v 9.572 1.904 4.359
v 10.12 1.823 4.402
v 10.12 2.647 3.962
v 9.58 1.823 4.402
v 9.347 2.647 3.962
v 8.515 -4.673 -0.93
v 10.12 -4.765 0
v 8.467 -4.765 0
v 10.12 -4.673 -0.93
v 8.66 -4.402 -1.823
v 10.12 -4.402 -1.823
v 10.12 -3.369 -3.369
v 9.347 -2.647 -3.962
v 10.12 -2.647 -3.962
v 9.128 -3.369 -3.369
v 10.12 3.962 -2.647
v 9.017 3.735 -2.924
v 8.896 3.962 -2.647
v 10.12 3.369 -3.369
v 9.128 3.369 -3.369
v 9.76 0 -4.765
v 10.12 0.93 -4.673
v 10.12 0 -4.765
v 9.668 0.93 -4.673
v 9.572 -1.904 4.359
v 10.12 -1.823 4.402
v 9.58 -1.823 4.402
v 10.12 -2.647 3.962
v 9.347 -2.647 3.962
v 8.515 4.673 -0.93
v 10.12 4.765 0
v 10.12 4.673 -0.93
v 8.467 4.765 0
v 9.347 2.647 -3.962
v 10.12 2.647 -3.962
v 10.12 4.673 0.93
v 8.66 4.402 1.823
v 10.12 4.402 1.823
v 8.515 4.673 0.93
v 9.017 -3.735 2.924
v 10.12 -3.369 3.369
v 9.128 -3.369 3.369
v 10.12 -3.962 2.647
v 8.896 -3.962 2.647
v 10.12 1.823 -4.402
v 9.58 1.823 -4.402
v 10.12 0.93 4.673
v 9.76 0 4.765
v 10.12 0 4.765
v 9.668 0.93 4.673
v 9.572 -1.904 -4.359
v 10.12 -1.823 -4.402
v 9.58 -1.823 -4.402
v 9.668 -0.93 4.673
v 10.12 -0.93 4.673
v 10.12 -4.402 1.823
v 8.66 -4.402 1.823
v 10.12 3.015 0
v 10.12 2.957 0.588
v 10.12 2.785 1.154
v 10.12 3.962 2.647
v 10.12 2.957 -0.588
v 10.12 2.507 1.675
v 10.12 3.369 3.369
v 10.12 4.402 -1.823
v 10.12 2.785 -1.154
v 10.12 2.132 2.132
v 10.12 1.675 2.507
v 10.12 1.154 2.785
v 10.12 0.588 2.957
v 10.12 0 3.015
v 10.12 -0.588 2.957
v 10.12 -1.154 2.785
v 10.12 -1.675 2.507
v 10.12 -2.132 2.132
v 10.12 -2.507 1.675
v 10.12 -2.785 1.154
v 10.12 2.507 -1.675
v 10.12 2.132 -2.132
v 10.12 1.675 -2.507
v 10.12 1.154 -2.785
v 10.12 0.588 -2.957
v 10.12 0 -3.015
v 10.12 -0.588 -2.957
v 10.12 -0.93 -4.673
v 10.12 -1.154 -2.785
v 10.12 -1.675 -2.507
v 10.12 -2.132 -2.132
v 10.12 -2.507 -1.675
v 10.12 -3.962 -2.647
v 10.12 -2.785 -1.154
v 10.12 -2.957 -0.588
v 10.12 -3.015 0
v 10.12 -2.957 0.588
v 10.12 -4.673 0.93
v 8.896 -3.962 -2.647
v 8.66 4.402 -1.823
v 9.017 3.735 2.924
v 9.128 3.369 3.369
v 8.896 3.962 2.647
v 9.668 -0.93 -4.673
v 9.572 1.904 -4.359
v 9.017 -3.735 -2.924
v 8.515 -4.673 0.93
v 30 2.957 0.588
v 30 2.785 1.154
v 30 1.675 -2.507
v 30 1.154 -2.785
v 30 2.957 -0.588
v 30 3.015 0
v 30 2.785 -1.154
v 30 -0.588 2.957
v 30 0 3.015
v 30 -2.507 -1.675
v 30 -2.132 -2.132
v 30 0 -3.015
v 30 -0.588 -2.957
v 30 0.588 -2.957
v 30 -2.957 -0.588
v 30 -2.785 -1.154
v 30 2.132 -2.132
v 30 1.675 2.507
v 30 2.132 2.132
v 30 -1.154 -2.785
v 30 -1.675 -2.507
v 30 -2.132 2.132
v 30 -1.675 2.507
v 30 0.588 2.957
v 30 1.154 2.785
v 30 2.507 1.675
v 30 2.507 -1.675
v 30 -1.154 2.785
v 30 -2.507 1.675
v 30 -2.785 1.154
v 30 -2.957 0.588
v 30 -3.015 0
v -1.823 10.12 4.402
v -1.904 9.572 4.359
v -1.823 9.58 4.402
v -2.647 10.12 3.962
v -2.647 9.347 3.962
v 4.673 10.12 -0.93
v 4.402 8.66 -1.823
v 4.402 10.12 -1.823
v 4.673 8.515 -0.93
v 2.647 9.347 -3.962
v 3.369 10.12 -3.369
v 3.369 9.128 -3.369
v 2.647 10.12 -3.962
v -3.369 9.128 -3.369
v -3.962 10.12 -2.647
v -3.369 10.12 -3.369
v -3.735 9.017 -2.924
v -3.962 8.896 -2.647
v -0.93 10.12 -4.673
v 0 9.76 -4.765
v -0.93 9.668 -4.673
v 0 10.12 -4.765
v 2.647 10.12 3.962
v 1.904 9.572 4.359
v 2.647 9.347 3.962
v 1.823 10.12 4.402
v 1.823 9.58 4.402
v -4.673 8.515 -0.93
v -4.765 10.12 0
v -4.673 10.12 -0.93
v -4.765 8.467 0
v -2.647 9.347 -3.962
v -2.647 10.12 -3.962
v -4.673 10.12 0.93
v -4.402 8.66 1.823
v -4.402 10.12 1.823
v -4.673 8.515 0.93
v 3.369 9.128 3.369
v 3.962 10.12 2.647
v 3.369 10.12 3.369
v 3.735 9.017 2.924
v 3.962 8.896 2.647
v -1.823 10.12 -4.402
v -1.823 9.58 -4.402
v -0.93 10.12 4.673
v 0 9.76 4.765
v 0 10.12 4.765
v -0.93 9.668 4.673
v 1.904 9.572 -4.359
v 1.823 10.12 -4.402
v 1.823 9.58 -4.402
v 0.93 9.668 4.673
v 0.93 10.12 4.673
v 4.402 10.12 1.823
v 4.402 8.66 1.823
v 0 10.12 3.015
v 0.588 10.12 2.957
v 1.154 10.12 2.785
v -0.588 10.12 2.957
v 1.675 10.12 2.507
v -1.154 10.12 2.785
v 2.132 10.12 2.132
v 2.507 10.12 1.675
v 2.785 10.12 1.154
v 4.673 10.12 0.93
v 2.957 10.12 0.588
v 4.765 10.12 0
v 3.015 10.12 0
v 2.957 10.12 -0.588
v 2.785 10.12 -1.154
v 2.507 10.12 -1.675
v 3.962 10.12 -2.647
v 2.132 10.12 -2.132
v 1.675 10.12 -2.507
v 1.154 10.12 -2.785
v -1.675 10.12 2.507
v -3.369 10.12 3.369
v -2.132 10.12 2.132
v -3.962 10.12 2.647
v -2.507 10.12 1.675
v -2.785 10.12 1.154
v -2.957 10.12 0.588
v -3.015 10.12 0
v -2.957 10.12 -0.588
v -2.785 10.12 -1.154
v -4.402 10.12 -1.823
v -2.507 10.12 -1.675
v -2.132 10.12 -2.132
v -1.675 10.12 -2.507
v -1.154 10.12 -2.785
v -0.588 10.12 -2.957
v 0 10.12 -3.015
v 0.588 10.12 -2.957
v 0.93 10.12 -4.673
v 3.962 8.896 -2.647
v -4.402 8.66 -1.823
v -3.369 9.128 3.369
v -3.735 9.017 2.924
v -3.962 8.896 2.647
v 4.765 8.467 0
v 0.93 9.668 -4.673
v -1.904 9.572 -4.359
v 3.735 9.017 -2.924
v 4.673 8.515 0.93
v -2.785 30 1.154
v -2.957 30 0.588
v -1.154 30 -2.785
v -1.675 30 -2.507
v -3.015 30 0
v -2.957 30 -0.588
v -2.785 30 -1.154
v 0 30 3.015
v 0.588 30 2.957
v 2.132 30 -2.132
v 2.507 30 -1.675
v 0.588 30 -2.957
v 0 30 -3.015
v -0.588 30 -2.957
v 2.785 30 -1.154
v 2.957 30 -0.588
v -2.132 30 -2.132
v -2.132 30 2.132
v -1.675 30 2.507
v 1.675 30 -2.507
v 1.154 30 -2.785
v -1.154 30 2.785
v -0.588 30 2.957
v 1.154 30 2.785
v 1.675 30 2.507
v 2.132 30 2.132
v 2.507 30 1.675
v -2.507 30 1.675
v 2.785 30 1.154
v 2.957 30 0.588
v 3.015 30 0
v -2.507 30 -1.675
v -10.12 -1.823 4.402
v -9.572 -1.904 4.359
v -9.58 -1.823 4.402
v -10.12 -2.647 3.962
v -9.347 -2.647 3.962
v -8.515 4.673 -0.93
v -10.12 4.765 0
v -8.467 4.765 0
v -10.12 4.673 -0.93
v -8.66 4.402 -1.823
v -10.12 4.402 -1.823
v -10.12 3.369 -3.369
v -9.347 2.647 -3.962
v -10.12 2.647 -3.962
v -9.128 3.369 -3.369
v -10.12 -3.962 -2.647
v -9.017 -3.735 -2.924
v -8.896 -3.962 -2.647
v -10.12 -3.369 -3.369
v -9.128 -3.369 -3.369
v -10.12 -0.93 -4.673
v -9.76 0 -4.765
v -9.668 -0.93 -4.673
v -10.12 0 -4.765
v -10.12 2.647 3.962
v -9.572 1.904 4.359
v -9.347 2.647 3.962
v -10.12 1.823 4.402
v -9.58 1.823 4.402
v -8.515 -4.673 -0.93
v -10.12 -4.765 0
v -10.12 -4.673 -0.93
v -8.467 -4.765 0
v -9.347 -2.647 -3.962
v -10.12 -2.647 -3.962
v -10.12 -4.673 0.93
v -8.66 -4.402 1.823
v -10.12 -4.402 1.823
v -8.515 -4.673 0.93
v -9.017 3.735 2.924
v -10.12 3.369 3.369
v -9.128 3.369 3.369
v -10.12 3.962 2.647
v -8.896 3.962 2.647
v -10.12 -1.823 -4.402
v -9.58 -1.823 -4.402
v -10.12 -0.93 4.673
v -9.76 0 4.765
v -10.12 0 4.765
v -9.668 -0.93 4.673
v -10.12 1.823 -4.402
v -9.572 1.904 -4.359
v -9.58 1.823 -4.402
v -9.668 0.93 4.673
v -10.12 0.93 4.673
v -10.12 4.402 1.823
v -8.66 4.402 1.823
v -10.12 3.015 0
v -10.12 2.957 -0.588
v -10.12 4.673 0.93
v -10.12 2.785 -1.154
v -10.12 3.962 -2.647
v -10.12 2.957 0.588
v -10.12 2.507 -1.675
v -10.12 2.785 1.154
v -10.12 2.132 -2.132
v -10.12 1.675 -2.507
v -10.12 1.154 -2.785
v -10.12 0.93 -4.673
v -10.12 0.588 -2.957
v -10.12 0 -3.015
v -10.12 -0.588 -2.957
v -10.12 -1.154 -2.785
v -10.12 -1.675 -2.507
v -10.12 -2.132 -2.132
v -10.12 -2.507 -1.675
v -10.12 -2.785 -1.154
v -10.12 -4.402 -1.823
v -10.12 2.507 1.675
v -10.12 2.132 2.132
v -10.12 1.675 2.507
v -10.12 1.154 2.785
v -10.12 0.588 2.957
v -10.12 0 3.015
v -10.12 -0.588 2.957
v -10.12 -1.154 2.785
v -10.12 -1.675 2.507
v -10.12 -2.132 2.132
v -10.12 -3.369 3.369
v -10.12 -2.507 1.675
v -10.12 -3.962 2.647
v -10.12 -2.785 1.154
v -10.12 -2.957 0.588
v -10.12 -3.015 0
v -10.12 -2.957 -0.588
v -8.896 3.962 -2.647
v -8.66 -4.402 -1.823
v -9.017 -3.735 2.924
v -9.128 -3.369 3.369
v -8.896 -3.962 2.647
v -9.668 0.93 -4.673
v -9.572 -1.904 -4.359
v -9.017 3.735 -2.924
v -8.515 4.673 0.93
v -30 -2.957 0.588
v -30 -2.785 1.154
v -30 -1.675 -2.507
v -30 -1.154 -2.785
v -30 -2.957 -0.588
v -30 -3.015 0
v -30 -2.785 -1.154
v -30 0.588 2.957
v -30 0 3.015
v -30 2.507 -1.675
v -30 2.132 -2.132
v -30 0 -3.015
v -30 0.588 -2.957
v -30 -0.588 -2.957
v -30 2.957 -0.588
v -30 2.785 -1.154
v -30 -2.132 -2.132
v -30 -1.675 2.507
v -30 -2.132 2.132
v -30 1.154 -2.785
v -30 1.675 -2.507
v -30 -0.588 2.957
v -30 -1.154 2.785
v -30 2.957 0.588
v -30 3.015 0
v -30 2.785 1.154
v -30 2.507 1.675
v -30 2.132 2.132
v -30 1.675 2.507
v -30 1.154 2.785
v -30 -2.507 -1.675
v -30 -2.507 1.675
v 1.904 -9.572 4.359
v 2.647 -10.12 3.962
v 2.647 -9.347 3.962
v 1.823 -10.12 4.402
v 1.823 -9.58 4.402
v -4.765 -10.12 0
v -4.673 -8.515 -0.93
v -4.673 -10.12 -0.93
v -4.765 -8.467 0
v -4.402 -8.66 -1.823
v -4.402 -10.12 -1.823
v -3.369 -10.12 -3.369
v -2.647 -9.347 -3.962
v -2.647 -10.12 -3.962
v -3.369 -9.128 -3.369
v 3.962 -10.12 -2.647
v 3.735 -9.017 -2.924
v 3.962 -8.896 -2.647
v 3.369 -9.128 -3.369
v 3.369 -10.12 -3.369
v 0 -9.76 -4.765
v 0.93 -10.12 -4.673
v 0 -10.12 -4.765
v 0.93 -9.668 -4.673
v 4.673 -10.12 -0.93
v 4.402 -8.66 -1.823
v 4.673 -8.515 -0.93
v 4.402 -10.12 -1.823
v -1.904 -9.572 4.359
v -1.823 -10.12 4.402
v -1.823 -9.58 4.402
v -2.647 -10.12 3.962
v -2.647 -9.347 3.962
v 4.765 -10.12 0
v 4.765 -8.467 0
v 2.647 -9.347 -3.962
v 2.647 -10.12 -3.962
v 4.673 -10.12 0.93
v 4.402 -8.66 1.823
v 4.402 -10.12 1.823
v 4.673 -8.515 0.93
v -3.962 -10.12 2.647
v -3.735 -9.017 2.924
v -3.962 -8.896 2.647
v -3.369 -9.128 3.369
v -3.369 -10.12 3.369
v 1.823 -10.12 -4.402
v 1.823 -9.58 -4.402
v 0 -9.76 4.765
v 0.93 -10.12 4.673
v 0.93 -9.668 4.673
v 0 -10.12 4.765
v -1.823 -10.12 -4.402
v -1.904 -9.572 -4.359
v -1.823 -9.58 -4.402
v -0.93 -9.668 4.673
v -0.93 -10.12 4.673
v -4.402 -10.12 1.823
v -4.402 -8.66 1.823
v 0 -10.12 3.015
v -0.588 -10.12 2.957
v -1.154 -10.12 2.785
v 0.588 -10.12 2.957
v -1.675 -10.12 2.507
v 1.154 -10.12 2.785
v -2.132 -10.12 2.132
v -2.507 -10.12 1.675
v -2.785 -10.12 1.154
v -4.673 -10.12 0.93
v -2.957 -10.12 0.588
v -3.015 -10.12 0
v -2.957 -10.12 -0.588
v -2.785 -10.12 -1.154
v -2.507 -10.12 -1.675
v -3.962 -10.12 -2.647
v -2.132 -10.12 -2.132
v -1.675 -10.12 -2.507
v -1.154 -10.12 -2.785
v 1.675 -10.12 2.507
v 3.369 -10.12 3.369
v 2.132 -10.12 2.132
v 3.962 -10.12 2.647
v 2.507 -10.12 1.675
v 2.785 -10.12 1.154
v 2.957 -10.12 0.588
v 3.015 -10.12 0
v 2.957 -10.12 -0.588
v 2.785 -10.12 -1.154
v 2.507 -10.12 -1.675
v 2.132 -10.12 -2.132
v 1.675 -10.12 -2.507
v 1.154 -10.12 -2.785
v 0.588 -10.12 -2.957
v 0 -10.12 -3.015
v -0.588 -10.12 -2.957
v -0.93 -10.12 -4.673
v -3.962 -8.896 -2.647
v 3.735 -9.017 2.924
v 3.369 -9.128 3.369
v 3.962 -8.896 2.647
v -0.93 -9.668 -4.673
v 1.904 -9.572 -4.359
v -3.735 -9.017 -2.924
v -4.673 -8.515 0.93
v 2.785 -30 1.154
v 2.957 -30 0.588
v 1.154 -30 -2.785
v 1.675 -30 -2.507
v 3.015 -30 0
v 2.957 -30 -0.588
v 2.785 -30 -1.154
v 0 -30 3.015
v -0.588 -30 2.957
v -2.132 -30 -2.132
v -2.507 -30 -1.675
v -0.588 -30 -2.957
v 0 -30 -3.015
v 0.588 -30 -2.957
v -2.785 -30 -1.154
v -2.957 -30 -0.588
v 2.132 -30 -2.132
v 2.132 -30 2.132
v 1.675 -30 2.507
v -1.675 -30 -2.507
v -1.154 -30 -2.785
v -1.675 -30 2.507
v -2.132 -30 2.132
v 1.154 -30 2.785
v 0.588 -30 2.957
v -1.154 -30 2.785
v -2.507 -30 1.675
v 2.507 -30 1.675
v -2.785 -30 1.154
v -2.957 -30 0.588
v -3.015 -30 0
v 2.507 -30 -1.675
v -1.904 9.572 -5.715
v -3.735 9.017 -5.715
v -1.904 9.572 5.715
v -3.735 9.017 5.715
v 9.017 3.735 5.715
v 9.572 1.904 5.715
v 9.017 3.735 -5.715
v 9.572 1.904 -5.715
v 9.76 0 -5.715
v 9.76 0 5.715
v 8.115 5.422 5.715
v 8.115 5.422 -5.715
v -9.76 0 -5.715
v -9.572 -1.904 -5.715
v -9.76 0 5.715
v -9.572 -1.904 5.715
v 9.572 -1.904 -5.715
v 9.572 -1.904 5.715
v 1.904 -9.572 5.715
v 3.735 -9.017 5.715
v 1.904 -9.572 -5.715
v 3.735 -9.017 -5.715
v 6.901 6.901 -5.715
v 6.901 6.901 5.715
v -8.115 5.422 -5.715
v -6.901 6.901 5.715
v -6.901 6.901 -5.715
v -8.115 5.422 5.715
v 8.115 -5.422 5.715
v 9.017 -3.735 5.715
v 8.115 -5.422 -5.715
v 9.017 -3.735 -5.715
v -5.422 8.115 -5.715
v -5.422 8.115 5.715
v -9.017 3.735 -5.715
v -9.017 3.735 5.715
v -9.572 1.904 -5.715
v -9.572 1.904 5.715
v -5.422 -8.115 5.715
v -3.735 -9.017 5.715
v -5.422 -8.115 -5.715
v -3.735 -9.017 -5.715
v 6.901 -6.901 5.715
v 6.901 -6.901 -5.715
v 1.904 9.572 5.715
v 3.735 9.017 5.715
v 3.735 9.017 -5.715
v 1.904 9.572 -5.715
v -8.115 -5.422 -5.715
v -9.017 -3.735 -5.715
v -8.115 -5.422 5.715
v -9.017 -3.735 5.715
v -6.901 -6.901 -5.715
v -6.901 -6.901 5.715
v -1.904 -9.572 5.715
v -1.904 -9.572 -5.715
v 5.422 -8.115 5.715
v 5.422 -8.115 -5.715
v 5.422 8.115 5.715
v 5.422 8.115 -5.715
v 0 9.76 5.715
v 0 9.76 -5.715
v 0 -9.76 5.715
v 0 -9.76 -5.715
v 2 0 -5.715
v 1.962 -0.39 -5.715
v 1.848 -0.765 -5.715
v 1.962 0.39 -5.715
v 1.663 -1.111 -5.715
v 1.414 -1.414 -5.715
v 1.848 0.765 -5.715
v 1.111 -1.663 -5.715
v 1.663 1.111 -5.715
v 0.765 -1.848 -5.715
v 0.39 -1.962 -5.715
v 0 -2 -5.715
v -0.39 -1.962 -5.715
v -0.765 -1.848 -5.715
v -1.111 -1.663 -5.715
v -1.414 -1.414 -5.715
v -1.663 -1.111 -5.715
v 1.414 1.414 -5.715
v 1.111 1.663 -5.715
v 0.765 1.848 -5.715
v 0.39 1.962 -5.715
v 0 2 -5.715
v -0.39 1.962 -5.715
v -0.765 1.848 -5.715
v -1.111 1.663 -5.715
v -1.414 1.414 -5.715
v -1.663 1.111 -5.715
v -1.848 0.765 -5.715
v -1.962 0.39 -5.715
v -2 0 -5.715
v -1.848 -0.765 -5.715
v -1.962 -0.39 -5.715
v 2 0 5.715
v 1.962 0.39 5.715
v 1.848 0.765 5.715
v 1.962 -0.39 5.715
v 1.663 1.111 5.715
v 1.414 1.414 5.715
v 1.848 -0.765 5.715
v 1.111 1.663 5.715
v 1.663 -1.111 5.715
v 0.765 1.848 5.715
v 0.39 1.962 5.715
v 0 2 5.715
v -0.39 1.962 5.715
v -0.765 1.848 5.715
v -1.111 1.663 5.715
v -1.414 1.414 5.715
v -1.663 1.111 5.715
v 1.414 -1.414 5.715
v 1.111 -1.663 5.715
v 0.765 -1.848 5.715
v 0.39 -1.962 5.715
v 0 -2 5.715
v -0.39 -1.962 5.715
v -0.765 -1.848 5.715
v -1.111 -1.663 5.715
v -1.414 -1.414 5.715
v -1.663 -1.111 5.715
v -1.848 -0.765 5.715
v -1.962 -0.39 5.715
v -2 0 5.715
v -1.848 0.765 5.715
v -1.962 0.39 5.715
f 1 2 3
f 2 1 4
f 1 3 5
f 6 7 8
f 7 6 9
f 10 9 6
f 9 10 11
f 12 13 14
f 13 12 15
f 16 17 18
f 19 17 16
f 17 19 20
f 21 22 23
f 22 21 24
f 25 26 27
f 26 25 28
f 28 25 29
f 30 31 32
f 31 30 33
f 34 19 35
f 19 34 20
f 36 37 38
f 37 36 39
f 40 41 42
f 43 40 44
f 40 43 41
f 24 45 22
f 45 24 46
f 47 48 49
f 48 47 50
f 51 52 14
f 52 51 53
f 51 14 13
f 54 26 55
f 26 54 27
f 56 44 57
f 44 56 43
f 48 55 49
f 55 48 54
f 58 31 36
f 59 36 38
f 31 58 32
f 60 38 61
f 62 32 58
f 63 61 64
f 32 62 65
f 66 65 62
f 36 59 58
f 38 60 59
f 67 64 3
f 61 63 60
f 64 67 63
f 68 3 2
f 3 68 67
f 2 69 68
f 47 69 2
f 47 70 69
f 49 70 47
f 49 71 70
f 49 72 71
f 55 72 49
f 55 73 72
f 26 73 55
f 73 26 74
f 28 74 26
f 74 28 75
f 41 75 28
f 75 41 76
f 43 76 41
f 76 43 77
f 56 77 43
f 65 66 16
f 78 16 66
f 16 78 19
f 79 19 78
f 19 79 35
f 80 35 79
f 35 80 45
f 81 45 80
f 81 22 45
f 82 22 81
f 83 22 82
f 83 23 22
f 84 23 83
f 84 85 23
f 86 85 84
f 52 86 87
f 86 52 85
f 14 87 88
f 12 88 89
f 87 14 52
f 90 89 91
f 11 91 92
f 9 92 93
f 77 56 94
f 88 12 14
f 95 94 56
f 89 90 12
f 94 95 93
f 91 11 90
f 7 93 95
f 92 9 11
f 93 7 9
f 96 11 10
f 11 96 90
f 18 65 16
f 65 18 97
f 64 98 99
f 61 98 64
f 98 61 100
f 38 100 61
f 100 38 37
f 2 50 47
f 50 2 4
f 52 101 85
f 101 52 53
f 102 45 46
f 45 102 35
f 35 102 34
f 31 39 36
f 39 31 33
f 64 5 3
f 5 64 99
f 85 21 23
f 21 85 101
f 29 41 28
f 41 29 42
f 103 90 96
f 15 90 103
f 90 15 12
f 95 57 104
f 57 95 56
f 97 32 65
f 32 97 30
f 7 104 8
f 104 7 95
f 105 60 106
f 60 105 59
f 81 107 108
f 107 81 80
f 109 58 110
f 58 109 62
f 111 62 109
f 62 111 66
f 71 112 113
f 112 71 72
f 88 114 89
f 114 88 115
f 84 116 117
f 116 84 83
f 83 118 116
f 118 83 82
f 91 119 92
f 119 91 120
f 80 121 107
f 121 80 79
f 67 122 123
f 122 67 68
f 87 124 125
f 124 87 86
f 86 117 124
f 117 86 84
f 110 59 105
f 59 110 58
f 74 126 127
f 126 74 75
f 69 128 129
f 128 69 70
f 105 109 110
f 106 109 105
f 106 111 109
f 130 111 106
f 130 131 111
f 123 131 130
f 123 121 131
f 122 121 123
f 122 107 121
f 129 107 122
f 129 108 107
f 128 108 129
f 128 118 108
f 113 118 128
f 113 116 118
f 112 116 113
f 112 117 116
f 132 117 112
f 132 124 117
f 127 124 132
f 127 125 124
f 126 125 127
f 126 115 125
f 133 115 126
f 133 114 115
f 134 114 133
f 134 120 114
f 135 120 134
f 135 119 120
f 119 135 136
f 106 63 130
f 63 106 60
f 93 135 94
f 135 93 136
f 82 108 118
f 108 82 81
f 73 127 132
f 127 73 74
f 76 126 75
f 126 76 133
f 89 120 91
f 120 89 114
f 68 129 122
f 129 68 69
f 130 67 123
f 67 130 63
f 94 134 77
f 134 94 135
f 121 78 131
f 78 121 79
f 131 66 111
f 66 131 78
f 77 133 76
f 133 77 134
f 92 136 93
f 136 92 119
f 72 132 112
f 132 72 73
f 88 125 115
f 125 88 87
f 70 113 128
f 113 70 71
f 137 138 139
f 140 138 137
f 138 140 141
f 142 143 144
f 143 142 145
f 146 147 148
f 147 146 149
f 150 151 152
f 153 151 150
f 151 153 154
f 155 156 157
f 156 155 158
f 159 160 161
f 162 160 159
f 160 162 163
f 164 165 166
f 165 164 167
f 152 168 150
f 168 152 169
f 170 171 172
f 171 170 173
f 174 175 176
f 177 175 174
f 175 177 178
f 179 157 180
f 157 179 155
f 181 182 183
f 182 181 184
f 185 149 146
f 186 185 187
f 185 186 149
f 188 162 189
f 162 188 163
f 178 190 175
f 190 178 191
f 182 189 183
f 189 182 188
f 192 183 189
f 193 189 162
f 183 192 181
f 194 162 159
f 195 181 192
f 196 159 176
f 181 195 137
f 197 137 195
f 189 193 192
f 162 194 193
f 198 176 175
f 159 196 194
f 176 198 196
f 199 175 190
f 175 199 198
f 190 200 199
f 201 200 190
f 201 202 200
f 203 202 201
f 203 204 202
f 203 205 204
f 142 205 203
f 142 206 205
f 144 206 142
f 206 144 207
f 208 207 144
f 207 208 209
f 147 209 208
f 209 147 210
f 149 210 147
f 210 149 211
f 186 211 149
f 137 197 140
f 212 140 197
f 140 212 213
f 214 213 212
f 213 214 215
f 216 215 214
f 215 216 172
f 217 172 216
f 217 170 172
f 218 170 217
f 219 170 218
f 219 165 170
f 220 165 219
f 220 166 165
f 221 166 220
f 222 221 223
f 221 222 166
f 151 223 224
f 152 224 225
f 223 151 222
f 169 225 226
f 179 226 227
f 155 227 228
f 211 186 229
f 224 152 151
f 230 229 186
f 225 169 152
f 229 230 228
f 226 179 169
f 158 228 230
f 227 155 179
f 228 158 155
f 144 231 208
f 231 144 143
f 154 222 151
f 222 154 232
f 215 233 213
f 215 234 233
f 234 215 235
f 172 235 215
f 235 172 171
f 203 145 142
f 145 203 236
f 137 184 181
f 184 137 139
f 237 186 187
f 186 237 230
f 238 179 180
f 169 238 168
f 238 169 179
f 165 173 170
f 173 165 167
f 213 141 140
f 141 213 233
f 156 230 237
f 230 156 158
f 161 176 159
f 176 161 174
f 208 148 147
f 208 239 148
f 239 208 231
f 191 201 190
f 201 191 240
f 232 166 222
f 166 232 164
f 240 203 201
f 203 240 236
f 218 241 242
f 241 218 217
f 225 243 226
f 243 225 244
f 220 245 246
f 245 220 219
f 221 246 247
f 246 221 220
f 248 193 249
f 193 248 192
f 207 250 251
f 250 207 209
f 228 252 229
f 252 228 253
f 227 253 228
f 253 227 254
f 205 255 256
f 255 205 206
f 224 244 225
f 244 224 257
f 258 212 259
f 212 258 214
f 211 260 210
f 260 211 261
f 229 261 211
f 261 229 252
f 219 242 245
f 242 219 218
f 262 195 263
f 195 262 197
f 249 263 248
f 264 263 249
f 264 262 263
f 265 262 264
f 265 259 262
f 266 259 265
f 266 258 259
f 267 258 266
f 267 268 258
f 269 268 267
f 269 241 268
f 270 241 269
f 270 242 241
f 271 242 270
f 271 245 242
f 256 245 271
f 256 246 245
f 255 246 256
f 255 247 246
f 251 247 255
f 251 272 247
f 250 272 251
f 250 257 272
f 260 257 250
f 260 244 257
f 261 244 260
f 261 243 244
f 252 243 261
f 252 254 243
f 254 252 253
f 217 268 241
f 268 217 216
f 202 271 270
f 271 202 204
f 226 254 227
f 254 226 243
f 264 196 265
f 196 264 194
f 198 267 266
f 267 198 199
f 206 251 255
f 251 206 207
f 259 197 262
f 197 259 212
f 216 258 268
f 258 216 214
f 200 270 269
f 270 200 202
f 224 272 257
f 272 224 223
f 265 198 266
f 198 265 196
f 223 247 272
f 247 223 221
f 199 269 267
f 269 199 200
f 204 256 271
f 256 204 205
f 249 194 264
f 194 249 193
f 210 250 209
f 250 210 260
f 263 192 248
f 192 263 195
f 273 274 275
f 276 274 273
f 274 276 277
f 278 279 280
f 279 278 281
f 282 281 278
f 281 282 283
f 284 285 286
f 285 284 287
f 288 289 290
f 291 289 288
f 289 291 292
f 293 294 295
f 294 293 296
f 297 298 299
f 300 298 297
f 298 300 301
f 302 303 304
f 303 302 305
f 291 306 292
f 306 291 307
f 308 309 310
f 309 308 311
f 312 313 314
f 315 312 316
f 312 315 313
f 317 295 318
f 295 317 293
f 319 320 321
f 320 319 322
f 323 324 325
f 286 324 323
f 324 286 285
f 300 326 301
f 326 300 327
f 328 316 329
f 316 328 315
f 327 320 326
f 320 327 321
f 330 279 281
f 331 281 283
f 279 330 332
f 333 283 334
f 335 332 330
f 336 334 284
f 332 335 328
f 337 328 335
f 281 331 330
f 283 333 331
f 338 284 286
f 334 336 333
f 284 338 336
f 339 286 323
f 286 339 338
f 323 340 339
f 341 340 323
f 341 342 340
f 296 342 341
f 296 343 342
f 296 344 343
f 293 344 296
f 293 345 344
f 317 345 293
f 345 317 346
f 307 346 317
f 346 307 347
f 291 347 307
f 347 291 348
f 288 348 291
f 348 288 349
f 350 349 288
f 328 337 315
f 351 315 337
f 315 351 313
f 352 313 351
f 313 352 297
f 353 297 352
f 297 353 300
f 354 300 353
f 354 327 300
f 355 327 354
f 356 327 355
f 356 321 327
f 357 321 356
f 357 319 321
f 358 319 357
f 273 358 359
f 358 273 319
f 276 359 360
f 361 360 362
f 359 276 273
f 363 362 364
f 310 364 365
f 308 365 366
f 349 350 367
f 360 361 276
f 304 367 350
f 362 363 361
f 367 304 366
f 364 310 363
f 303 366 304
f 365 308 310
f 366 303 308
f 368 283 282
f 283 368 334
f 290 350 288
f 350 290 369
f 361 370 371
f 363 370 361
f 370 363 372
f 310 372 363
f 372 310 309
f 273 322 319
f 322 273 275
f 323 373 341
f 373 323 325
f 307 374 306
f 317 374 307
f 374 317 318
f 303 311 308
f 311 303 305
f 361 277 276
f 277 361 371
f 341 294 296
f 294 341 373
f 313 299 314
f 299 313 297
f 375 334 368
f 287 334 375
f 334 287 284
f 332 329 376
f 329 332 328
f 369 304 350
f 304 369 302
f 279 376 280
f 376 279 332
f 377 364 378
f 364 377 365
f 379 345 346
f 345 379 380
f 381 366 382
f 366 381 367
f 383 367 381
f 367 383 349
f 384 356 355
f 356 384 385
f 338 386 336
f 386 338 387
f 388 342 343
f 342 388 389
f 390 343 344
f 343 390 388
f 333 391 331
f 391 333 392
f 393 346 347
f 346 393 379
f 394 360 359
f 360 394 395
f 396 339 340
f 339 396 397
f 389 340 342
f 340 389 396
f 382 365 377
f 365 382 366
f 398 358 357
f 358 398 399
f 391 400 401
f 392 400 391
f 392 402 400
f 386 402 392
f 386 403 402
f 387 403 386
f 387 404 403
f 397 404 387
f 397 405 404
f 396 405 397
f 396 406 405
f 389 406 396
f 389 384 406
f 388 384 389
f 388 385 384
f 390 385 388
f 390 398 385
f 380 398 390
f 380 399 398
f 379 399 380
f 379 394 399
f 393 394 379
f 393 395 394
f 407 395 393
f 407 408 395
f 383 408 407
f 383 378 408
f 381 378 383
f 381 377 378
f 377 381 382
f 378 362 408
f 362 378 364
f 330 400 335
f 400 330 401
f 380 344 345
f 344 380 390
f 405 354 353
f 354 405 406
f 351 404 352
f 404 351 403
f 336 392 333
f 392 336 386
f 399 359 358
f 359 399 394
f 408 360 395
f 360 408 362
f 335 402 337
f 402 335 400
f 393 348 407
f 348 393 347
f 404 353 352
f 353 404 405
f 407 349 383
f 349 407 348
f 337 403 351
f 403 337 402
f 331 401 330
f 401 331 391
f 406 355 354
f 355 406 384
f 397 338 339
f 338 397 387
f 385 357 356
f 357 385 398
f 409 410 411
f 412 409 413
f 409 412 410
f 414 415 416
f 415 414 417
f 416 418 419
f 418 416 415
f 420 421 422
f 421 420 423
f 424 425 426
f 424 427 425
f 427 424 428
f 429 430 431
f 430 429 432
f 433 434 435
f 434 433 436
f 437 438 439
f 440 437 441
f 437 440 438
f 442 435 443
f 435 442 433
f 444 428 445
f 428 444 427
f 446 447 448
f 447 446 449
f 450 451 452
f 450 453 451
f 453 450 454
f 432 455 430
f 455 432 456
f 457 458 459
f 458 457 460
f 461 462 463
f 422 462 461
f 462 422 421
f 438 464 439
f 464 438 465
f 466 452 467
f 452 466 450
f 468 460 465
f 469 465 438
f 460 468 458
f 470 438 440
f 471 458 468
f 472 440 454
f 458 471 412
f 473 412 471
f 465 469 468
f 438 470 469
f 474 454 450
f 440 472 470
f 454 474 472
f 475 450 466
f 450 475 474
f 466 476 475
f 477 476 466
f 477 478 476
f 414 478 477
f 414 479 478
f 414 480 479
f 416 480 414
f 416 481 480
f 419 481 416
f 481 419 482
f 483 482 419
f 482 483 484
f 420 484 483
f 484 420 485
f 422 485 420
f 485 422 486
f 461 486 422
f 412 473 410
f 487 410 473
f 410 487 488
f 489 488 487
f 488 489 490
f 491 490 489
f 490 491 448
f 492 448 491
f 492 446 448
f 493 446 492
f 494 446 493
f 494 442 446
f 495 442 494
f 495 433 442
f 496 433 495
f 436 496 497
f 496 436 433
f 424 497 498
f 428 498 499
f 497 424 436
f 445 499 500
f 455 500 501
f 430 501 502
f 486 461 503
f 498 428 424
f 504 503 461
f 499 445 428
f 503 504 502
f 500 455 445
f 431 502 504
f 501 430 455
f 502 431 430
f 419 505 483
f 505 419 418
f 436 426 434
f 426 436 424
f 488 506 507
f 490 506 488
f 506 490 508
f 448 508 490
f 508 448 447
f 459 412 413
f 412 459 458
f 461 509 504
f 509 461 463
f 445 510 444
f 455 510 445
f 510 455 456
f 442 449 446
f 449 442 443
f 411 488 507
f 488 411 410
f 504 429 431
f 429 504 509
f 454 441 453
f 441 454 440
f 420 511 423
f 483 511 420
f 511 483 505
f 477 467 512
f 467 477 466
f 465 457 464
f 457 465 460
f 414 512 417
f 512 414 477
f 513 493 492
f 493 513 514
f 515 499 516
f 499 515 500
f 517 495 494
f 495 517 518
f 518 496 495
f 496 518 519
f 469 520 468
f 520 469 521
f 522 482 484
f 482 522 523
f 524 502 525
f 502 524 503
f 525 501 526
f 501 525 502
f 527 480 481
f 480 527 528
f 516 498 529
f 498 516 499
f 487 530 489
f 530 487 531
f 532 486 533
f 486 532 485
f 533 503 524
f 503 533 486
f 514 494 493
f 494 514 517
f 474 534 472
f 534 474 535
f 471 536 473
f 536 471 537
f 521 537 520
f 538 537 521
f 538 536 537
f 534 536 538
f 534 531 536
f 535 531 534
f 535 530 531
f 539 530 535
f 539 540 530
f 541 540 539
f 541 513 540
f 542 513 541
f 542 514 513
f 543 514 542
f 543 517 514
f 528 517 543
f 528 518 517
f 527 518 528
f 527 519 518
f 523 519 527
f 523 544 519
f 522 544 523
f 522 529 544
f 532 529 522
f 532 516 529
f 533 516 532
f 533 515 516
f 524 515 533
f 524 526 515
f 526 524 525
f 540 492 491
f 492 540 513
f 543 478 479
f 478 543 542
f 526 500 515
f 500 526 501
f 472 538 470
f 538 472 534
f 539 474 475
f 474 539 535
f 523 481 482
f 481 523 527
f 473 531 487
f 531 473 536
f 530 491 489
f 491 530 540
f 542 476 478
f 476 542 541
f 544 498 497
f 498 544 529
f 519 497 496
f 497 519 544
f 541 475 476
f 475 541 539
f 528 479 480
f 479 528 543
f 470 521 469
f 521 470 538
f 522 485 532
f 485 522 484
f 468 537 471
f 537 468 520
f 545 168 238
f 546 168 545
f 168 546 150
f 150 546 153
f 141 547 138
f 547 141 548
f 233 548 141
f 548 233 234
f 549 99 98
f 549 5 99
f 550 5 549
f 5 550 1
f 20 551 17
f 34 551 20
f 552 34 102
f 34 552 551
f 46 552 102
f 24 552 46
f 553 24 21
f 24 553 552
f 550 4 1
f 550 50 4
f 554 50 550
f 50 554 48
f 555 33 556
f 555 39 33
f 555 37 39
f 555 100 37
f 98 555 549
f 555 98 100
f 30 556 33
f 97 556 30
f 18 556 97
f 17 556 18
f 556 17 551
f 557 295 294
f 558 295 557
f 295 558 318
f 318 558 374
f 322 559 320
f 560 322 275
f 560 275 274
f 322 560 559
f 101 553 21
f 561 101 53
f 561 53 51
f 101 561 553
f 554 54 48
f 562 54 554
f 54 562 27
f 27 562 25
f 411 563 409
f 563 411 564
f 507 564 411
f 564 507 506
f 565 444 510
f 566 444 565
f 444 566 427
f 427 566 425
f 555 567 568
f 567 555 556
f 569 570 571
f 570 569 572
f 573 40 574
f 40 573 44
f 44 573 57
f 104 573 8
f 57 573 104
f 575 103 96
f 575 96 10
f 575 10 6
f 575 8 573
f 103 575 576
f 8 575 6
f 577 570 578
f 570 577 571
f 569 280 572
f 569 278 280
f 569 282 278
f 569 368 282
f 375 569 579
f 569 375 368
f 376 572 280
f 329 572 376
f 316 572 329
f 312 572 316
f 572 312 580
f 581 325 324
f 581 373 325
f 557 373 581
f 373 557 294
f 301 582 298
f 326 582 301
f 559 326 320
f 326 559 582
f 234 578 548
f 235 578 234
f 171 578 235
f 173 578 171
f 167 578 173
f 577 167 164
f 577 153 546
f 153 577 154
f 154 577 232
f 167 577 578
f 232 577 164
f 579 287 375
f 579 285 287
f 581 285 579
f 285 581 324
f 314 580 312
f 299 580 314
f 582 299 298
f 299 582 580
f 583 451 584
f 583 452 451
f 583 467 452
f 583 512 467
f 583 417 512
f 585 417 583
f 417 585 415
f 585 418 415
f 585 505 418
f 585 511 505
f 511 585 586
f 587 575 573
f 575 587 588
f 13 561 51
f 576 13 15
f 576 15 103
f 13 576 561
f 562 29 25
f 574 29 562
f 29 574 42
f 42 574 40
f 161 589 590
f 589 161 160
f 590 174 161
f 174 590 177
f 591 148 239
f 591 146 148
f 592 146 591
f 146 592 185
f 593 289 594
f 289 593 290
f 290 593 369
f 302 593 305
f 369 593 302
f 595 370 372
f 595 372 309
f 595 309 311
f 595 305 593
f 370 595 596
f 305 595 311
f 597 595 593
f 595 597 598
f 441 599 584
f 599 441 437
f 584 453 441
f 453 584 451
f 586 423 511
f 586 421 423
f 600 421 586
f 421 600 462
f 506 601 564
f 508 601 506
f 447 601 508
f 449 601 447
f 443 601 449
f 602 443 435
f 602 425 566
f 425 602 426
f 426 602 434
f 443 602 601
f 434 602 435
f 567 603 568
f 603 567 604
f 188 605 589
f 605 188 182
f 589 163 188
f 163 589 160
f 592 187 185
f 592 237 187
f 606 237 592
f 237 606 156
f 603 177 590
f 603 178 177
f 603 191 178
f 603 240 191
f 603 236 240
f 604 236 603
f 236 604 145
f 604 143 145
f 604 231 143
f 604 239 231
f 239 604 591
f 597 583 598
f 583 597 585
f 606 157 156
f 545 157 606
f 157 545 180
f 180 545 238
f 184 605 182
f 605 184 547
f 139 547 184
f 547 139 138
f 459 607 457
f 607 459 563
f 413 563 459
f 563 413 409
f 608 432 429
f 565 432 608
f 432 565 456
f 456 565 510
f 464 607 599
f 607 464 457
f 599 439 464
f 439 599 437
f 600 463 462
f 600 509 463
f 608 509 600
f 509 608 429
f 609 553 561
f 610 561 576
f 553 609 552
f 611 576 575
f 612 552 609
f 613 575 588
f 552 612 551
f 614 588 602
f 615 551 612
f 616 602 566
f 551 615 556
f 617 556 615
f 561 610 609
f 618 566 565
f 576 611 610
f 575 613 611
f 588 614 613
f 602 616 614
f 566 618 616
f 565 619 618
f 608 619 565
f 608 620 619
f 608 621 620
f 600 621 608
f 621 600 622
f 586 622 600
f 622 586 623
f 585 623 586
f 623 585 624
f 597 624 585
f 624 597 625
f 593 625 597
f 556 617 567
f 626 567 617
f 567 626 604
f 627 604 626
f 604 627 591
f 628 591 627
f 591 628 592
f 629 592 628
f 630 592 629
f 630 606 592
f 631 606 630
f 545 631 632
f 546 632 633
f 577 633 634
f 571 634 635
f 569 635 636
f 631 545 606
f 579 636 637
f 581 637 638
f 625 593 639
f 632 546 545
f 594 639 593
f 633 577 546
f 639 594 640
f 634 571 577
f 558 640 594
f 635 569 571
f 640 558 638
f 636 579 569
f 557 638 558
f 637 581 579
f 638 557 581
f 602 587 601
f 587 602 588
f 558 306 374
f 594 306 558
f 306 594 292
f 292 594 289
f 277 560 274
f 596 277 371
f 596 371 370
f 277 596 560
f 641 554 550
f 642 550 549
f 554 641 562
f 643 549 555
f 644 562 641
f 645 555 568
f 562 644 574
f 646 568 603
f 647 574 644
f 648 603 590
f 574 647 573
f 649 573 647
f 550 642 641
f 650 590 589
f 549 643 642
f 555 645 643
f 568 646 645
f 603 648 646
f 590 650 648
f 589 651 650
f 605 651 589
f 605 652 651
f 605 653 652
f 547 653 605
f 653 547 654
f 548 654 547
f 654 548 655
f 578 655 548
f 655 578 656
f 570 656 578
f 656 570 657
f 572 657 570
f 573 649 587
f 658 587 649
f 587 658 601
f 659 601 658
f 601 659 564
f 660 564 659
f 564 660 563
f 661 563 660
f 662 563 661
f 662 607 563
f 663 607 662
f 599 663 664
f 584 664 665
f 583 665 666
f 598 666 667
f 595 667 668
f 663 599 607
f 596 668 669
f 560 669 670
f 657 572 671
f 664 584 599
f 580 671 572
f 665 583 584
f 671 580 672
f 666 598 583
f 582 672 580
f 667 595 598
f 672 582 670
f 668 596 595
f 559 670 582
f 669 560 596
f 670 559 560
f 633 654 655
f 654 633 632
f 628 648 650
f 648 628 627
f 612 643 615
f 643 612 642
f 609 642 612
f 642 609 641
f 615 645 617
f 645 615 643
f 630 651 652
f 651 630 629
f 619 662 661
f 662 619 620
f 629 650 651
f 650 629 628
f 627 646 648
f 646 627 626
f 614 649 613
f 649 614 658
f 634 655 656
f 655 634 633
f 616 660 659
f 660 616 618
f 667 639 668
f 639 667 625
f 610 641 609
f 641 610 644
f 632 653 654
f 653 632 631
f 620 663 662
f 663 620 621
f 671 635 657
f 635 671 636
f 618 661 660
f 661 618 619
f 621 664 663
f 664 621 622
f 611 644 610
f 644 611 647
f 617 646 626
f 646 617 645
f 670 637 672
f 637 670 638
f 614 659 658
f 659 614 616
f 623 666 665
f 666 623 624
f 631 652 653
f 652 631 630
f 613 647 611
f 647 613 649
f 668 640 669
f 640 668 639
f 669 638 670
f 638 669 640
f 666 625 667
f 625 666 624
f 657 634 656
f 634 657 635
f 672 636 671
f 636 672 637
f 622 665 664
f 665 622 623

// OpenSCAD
$fn = 32;

// ----------------------------------------------------------------------
// Cardan cross: 60 mm span, 9.53 mm trunnions
// ----------------------------------------------------------------------

// --- parameters (mm) ---
journal_d = 9.53;         // trunnion diameter
arm_len = 30;             // trunnion length from the centre
step_r = 3.24;            // step position from the centre
step_d = 6.03;            // journal diameter after the step
hub_d = 19.52;            // hub diameter
hub_h = 11.43;            // hub height
bore_d = 4;               // hub bore

difference() {
  union() {
    /* hub along the joint axis */
    cylinder(h = hub_h, d = hub_d, center = true);
    for (a = [0 : 90 : 270]) rotate([0, 0, a]) {
      /* trunnion, sunk into the hub */
      translate([hub_d / 4, 0, 0]) rotate([0, 90, 0]) cylinder(h = step_r + 2, d = journal_d);
      /* stepped journal out to the tip */
      translate([step_r - 0.5, 0, 0]) rotate([0, 90, 0]) cylinder(h = arm_len + 0.5 - step_r, d = step_d);
    }
  }
  /* lubrication bore through the hub, 2.5 mm clear on both sides */
  translate([0, 0, -hub_h / 2 - 2.5]) cylinder(h = hub_h + 5, d = bore_d);
}
